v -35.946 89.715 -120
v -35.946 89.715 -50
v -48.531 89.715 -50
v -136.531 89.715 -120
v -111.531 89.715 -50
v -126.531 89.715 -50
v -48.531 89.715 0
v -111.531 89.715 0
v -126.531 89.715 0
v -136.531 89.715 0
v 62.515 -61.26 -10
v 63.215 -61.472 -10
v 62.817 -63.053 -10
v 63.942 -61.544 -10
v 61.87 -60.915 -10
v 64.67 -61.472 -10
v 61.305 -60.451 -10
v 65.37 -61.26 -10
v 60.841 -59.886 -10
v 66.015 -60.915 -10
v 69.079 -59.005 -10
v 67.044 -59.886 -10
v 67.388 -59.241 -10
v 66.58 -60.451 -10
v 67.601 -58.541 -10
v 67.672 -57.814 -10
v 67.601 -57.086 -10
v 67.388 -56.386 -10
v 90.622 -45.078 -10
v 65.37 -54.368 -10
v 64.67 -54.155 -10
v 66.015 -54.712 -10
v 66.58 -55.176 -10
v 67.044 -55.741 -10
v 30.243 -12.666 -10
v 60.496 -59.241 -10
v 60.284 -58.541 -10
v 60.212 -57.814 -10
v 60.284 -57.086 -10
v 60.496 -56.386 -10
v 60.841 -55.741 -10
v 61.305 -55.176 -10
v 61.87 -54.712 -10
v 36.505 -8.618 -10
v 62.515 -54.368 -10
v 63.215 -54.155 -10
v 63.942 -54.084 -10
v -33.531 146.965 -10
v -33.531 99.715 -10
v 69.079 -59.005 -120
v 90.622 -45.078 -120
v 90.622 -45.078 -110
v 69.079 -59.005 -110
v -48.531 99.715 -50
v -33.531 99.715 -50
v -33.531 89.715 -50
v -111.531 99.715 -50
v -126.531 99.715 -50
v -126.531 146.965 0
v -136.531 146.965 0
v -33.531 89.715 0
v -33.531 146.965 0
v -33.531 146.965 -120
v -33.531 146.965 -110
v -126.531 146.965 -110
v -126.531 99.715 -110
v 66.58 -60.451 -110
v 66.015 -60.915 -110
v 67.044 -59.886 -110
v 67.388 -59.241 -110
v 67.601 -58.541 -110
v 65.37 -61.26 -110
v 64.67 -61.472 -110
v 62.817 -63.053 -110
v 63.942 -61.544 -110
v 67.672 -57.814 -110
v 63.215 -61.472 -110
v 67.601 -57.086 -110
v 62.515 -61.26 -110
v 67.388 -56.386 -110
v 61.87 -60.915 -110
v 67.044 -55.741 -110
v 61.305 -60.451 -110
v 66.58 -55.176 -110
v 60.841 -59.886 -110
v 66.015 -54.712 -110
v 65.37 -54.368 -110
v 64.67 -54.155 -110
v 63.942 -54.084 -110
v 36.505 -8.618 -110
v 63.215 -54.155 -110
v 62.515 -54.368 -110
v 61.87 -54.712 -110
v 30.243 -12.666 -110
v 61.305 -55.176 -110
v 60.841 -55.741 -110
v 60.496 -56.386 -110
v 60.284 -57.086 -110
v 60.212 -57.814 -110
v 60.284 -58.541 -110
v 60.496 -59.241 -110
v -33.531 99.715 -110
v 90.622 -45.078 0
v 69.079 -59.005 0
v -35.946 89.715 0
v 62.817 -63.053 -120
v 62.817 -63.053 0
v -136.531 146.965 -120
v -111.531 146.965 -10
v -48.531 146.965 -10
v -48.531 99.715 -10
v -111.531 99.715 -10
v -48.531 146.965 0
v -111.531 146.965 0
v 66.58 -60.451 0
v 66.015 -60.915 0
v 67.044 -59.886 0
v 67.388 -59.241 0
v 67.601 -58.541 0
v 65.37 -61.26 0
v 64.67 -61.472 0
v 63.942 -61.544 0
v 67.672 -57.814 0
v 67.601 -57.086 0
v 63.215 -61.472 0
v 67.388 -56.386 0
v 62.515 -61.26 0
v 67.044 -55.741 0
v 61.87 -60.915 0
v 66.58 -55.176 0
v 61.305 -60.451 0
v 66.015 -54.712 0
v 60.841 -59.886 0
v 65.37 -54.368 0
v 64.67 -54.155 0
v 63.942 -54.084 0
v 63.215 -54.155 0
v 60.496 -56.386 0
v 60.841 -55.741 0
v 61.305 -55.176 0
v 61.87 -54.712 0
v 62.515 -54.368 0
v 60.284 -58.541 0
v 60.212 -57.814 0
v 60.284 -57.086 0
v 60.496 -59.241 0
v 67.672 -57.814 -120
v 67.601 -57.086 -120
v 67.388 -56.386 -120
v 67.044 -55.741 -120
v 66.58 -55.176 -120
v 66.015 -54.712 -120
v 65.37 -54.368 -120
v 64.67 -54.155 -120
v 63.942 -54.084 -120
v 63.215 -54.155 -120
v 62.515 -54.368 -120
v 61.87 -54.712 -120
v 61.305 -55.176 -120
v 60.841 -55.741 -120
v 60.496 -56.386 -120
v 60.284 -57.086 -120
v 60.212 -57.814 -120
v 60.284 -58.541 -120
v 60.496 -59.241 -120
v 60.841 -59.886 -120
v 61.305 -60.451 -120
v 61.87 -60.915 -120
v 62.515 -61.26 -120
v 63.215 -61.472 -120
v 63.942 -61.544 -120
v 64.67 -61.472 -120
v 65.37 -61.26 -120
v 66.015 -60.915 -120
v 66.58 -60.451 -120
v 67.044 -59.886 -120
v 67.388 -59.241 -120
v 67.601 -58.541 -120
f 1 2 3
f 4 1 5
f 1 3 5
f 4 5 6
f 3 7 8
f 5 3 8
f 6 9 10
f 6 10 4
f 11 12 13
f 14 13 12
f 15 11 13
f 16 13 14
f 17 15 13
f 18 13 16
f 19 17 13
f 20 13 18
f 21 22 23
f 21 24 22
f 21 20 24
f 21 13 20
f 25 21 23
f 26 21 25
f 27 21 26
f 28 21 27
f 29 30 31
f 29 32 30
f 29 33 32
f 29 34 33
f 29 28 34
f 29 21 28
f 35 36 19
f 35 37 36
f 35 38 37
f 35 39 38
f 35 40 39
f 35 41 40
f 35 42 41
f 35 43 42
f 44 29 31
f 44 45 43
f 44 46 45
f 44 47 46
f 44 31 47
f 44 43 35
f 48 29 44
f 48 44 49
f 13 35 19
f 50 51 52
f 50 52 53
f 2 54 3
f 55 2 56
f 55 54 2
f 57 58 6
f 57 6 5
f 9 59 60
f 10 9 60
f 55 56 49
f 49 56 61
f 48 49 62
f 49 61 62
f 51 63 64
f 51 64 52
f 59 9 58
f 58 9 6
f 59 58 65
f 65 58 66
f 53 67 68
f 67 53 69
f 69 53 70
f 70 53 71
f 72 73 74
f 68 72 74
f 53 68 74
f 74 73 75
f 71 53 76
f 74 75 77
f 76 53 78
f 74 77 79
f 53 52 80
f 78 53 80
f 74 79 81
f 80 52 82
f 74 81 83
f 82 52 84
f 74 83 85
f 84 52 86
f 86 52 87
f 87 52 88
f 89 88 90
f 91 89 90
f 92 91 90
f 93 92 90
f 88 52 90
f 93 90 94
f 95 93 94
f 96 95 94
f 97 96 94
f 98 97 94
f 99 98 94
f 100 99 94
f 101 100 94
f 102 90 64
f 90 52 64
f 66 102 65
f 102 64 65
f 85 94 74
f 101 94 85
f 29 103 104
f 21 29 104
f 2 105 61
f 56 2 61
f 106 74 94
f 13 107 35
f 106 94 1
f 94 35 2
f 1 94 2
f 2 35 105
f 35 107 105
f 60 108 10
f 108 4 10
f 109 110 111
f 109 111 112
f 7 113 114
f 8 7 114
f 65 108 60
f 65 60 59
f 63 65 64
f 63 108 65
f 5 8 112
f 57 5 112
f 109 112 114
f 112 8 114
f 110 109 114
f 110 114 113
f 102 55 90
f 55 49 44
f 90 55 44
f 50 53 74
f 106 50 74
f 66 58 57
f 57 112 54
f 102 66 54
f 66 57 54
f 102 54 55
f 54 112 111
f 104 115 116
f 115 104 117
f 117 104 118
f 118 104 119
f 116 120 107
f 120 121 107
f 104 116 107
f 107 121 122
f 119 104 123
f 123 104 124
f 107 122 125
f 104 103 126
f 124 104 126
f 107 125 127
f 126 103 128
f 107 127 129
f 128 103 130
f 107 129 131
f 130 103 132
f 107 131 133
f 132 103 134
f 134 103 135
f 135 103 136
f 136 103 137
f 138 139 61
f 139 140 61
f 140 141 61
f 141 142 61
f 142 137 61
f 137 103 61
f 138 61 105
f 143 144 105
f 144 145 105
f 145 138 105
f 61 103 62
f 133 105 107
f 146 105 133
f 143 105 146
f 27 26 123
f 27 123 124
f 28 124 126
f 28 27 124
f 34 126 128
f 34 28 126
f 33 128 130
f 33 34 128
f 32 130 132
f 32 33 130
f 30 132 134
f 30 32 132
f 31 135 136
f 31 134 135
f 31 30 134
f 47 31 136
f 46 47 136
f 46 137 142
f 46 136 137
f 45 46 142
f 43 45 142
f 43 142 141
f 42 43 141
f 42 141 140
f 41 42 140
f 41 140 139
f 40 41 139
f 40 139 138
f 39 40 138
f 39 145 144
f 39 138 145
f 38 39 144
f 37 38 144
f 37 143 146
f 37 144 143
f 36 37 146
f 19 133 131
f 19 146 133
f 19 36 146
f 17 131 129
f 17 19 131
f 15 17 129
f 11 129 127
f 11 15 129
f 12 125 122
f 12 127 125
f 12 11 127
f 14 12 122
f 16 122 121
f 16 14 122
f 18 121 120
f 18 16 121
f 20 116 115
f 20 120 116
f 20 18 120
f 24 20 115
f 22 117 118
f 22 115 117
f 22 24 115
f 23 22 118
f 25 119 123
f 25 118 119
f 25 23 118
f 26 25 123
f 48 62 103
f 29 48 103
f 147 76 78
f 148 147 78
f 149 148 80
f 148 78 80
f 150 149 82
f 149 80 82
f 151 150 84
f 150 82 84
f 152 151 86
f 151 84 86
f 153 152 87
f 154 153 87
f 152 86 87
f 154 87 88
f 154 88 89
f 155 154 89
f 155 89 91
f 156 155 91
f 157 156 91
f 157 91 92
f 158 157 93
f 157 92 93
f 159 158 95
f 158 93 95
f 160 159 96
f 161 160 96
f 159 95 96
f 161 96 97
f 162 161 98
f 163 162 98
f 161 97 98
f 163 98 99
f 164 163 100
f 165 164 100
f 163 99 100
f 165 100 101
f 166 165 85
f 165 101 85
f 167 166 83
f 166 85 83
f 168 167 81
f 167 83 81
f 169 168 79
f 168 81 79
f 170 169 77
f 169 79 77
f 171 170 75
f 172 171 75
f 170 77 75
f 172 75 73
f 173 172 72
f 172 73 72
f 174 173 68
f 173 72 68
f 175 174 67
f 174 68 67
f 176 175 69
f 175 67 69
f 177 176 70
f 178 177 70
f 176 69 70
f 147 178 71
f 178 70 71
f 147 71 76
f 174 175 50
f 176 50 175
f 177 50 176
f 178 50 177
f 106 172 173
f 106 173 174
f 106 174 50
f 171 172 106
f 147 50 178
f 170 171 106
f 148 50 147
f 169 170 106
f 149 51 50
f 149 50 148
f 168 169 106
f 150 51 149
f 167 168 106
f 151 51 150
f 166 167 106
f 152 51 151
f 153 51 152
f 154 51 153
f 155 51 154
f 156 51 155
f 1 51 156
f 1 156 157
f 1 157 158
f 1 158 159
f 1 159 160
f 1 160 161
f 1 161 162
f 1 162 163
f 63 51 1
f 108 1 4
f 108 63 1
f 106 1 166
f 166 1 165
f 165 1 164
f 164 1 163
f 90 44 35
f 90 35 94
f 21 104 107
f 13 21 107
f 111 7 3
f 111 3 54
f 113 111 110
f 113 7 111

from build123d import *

# Parameters (mm, degrees)
BOSS_EXTRU_1_DEPTH                  = 120
BOSS_EXTRU_3_DEPTH                  = 47.25
BOSS_EXTRU_4_DEPTH                  = 10
BOSS_EXTRU_5_DEPTH                  = 10
ESQUISSE6_W                         = 15
ESQUISSE6_H                         = 57.25
ENL_V_MAT_EXTRU_1_DEPTH             = 50
ESQUISSE7_W                         = 100
ESQUISSE7_H                         = 60
ENL_V_MAT_EXTRU_2_DEPTH             = 10
ESQUISSE8_R                         = 3.73
ENL_V_MAT_EXTRU_3_DEPTH             = 10
ENL_V_MAT_EXTRU_3_DIRECTION_2_REACH = 112


with BuildPart() as part:
    # Esquisse1 → Boss.-Extru.1 (new body)
    with BuildSketch(Plane.XY):
        Polygon((-33.531301397, 99.715192212), (69.079300245, -59.00488979), (62.817327254, -63.053179131), (-35.94556587, 89.715192212), (-136.531301397, 89.715192212), (-136.531301397, 99.715192212), align=None)
    extrude(amount=-BOSS_EXTRU_1_DEPTH)

    # Esquisse3 → Boss.-Extru.3 (add)
    with BuildSketch(Plane(origin=(0, 99.715192212, 0), x_dir=(1, 0, 0), z_dir=(0, 1, 0))):
        Polygon((-33.531301397, 110), (-33.531301397, 120), (-136.531301397, 120), (-136.531301397, 0), (-33.531301397, 0), (-33.531301397, 10), (-126.531301397, 10), (-126.531301397, 110), align=None)
    extrude(amount=BOSS_EXTRU_3_DEPTH)

    # Esquisse4 → Boss.-Extru.4 (add)
    with BuildSketch(Plane.XY):
        Polygon((-33.531301397, 146.965192212), (90.622108587, -45.077726339), (69.079300245, -59.00488979), (-33.531301397, 99.715192212), align=None)
    extrude(amount=-BOSS_EXTRU_4_DEPTH)

    # Esquisse5 → Boss.-Extru.5 (add)
    with BuildSketch(Plane(origin=(0, 0, -120), x_dir=(-1, 0, 0), z_dir=(0, 0, -1))):
        Polygon((33.531301397, 99.715192212), (33.531301397, 146.965192212), (-90.622108587, -45.077726339), (-69.079300245, -59.00488979), align=None)
    extrude(amount=-BOSS_EXTRU_5_DEPTH)

    # Esquisse6 → Enlèv. mat.-Extru.1 (cut)
    with BuildSketch(Plane.XY):
        with Locations((-119.031301397, 118.340192212)):
            Rectangle(ESQUISSE6_W, ESQUISSE6_H)
        with Locations((-41.031301397, 118.340192212)):
            Rectangle(ESQUISSE6_W, ESQUISSE6_H)
    extrude(amount=-ENL_V_MAT_EXTRU_1_DEPTH, mode=Mode.SUBTRACT)

    # Esquisse7 → Enlèv. mat.-Extru.2 (cut)
    with BuildSketch(Plane(origin=(21.815602094, 14.103521292, 0), x_dir=(0, 0, -1), z_dir=(0.839788794, 0.542913236, 0))):
        with Locations((60, -57.055711668)):
            Rectangle(ESQUISSE7_W, ESQUISSE7_H)
    extrude(amount=-ENL_V_MAT_EXTRU_2_DEPTH, mode=Mode.SUBTRACT)

    # Esquisse8 → Enlèv. mat.-Extru.3 (cut)
    with BuildSketch(Plane.XY.offset(-110)):
        with Locations((63.942262825, -57.813776091)):
            Circle(ESQUISSE8_R)
    extrude(amount=-ENL_V_MAT_EXTRU_3_DEPTH, mode=Mode.SUBTRACT)

    # Esquisse8 → Enlèv. mat.-Extru.3 direction 2 (cut, up to next)
    with BuildSketch(Plane.XY.offset(-110), mode=Mode.PRIVATE) as enl_v_mat_extru_3_direction_2_sk1:
        with Locations((63.942262825, -57.813776091)):
            Circle(ESQUISSE8_R)
    enl_v_mat_extru_3_direction_2_tool1 = extrude(enl_v_mat_extru_3_direction_2_sk1.sketch, amount=ENL_V_MAT_EXTRU_3_DIRECTION_2_REACH, mode=Mode.PRIVATE) & part.part
    add(enl_v_mat_extru_3_direction_2_tool1.solids().sort_by_distance((63.942263, -57.813776, -110))[0], mode=Mode.SUBTRACT)


solid = part.part
